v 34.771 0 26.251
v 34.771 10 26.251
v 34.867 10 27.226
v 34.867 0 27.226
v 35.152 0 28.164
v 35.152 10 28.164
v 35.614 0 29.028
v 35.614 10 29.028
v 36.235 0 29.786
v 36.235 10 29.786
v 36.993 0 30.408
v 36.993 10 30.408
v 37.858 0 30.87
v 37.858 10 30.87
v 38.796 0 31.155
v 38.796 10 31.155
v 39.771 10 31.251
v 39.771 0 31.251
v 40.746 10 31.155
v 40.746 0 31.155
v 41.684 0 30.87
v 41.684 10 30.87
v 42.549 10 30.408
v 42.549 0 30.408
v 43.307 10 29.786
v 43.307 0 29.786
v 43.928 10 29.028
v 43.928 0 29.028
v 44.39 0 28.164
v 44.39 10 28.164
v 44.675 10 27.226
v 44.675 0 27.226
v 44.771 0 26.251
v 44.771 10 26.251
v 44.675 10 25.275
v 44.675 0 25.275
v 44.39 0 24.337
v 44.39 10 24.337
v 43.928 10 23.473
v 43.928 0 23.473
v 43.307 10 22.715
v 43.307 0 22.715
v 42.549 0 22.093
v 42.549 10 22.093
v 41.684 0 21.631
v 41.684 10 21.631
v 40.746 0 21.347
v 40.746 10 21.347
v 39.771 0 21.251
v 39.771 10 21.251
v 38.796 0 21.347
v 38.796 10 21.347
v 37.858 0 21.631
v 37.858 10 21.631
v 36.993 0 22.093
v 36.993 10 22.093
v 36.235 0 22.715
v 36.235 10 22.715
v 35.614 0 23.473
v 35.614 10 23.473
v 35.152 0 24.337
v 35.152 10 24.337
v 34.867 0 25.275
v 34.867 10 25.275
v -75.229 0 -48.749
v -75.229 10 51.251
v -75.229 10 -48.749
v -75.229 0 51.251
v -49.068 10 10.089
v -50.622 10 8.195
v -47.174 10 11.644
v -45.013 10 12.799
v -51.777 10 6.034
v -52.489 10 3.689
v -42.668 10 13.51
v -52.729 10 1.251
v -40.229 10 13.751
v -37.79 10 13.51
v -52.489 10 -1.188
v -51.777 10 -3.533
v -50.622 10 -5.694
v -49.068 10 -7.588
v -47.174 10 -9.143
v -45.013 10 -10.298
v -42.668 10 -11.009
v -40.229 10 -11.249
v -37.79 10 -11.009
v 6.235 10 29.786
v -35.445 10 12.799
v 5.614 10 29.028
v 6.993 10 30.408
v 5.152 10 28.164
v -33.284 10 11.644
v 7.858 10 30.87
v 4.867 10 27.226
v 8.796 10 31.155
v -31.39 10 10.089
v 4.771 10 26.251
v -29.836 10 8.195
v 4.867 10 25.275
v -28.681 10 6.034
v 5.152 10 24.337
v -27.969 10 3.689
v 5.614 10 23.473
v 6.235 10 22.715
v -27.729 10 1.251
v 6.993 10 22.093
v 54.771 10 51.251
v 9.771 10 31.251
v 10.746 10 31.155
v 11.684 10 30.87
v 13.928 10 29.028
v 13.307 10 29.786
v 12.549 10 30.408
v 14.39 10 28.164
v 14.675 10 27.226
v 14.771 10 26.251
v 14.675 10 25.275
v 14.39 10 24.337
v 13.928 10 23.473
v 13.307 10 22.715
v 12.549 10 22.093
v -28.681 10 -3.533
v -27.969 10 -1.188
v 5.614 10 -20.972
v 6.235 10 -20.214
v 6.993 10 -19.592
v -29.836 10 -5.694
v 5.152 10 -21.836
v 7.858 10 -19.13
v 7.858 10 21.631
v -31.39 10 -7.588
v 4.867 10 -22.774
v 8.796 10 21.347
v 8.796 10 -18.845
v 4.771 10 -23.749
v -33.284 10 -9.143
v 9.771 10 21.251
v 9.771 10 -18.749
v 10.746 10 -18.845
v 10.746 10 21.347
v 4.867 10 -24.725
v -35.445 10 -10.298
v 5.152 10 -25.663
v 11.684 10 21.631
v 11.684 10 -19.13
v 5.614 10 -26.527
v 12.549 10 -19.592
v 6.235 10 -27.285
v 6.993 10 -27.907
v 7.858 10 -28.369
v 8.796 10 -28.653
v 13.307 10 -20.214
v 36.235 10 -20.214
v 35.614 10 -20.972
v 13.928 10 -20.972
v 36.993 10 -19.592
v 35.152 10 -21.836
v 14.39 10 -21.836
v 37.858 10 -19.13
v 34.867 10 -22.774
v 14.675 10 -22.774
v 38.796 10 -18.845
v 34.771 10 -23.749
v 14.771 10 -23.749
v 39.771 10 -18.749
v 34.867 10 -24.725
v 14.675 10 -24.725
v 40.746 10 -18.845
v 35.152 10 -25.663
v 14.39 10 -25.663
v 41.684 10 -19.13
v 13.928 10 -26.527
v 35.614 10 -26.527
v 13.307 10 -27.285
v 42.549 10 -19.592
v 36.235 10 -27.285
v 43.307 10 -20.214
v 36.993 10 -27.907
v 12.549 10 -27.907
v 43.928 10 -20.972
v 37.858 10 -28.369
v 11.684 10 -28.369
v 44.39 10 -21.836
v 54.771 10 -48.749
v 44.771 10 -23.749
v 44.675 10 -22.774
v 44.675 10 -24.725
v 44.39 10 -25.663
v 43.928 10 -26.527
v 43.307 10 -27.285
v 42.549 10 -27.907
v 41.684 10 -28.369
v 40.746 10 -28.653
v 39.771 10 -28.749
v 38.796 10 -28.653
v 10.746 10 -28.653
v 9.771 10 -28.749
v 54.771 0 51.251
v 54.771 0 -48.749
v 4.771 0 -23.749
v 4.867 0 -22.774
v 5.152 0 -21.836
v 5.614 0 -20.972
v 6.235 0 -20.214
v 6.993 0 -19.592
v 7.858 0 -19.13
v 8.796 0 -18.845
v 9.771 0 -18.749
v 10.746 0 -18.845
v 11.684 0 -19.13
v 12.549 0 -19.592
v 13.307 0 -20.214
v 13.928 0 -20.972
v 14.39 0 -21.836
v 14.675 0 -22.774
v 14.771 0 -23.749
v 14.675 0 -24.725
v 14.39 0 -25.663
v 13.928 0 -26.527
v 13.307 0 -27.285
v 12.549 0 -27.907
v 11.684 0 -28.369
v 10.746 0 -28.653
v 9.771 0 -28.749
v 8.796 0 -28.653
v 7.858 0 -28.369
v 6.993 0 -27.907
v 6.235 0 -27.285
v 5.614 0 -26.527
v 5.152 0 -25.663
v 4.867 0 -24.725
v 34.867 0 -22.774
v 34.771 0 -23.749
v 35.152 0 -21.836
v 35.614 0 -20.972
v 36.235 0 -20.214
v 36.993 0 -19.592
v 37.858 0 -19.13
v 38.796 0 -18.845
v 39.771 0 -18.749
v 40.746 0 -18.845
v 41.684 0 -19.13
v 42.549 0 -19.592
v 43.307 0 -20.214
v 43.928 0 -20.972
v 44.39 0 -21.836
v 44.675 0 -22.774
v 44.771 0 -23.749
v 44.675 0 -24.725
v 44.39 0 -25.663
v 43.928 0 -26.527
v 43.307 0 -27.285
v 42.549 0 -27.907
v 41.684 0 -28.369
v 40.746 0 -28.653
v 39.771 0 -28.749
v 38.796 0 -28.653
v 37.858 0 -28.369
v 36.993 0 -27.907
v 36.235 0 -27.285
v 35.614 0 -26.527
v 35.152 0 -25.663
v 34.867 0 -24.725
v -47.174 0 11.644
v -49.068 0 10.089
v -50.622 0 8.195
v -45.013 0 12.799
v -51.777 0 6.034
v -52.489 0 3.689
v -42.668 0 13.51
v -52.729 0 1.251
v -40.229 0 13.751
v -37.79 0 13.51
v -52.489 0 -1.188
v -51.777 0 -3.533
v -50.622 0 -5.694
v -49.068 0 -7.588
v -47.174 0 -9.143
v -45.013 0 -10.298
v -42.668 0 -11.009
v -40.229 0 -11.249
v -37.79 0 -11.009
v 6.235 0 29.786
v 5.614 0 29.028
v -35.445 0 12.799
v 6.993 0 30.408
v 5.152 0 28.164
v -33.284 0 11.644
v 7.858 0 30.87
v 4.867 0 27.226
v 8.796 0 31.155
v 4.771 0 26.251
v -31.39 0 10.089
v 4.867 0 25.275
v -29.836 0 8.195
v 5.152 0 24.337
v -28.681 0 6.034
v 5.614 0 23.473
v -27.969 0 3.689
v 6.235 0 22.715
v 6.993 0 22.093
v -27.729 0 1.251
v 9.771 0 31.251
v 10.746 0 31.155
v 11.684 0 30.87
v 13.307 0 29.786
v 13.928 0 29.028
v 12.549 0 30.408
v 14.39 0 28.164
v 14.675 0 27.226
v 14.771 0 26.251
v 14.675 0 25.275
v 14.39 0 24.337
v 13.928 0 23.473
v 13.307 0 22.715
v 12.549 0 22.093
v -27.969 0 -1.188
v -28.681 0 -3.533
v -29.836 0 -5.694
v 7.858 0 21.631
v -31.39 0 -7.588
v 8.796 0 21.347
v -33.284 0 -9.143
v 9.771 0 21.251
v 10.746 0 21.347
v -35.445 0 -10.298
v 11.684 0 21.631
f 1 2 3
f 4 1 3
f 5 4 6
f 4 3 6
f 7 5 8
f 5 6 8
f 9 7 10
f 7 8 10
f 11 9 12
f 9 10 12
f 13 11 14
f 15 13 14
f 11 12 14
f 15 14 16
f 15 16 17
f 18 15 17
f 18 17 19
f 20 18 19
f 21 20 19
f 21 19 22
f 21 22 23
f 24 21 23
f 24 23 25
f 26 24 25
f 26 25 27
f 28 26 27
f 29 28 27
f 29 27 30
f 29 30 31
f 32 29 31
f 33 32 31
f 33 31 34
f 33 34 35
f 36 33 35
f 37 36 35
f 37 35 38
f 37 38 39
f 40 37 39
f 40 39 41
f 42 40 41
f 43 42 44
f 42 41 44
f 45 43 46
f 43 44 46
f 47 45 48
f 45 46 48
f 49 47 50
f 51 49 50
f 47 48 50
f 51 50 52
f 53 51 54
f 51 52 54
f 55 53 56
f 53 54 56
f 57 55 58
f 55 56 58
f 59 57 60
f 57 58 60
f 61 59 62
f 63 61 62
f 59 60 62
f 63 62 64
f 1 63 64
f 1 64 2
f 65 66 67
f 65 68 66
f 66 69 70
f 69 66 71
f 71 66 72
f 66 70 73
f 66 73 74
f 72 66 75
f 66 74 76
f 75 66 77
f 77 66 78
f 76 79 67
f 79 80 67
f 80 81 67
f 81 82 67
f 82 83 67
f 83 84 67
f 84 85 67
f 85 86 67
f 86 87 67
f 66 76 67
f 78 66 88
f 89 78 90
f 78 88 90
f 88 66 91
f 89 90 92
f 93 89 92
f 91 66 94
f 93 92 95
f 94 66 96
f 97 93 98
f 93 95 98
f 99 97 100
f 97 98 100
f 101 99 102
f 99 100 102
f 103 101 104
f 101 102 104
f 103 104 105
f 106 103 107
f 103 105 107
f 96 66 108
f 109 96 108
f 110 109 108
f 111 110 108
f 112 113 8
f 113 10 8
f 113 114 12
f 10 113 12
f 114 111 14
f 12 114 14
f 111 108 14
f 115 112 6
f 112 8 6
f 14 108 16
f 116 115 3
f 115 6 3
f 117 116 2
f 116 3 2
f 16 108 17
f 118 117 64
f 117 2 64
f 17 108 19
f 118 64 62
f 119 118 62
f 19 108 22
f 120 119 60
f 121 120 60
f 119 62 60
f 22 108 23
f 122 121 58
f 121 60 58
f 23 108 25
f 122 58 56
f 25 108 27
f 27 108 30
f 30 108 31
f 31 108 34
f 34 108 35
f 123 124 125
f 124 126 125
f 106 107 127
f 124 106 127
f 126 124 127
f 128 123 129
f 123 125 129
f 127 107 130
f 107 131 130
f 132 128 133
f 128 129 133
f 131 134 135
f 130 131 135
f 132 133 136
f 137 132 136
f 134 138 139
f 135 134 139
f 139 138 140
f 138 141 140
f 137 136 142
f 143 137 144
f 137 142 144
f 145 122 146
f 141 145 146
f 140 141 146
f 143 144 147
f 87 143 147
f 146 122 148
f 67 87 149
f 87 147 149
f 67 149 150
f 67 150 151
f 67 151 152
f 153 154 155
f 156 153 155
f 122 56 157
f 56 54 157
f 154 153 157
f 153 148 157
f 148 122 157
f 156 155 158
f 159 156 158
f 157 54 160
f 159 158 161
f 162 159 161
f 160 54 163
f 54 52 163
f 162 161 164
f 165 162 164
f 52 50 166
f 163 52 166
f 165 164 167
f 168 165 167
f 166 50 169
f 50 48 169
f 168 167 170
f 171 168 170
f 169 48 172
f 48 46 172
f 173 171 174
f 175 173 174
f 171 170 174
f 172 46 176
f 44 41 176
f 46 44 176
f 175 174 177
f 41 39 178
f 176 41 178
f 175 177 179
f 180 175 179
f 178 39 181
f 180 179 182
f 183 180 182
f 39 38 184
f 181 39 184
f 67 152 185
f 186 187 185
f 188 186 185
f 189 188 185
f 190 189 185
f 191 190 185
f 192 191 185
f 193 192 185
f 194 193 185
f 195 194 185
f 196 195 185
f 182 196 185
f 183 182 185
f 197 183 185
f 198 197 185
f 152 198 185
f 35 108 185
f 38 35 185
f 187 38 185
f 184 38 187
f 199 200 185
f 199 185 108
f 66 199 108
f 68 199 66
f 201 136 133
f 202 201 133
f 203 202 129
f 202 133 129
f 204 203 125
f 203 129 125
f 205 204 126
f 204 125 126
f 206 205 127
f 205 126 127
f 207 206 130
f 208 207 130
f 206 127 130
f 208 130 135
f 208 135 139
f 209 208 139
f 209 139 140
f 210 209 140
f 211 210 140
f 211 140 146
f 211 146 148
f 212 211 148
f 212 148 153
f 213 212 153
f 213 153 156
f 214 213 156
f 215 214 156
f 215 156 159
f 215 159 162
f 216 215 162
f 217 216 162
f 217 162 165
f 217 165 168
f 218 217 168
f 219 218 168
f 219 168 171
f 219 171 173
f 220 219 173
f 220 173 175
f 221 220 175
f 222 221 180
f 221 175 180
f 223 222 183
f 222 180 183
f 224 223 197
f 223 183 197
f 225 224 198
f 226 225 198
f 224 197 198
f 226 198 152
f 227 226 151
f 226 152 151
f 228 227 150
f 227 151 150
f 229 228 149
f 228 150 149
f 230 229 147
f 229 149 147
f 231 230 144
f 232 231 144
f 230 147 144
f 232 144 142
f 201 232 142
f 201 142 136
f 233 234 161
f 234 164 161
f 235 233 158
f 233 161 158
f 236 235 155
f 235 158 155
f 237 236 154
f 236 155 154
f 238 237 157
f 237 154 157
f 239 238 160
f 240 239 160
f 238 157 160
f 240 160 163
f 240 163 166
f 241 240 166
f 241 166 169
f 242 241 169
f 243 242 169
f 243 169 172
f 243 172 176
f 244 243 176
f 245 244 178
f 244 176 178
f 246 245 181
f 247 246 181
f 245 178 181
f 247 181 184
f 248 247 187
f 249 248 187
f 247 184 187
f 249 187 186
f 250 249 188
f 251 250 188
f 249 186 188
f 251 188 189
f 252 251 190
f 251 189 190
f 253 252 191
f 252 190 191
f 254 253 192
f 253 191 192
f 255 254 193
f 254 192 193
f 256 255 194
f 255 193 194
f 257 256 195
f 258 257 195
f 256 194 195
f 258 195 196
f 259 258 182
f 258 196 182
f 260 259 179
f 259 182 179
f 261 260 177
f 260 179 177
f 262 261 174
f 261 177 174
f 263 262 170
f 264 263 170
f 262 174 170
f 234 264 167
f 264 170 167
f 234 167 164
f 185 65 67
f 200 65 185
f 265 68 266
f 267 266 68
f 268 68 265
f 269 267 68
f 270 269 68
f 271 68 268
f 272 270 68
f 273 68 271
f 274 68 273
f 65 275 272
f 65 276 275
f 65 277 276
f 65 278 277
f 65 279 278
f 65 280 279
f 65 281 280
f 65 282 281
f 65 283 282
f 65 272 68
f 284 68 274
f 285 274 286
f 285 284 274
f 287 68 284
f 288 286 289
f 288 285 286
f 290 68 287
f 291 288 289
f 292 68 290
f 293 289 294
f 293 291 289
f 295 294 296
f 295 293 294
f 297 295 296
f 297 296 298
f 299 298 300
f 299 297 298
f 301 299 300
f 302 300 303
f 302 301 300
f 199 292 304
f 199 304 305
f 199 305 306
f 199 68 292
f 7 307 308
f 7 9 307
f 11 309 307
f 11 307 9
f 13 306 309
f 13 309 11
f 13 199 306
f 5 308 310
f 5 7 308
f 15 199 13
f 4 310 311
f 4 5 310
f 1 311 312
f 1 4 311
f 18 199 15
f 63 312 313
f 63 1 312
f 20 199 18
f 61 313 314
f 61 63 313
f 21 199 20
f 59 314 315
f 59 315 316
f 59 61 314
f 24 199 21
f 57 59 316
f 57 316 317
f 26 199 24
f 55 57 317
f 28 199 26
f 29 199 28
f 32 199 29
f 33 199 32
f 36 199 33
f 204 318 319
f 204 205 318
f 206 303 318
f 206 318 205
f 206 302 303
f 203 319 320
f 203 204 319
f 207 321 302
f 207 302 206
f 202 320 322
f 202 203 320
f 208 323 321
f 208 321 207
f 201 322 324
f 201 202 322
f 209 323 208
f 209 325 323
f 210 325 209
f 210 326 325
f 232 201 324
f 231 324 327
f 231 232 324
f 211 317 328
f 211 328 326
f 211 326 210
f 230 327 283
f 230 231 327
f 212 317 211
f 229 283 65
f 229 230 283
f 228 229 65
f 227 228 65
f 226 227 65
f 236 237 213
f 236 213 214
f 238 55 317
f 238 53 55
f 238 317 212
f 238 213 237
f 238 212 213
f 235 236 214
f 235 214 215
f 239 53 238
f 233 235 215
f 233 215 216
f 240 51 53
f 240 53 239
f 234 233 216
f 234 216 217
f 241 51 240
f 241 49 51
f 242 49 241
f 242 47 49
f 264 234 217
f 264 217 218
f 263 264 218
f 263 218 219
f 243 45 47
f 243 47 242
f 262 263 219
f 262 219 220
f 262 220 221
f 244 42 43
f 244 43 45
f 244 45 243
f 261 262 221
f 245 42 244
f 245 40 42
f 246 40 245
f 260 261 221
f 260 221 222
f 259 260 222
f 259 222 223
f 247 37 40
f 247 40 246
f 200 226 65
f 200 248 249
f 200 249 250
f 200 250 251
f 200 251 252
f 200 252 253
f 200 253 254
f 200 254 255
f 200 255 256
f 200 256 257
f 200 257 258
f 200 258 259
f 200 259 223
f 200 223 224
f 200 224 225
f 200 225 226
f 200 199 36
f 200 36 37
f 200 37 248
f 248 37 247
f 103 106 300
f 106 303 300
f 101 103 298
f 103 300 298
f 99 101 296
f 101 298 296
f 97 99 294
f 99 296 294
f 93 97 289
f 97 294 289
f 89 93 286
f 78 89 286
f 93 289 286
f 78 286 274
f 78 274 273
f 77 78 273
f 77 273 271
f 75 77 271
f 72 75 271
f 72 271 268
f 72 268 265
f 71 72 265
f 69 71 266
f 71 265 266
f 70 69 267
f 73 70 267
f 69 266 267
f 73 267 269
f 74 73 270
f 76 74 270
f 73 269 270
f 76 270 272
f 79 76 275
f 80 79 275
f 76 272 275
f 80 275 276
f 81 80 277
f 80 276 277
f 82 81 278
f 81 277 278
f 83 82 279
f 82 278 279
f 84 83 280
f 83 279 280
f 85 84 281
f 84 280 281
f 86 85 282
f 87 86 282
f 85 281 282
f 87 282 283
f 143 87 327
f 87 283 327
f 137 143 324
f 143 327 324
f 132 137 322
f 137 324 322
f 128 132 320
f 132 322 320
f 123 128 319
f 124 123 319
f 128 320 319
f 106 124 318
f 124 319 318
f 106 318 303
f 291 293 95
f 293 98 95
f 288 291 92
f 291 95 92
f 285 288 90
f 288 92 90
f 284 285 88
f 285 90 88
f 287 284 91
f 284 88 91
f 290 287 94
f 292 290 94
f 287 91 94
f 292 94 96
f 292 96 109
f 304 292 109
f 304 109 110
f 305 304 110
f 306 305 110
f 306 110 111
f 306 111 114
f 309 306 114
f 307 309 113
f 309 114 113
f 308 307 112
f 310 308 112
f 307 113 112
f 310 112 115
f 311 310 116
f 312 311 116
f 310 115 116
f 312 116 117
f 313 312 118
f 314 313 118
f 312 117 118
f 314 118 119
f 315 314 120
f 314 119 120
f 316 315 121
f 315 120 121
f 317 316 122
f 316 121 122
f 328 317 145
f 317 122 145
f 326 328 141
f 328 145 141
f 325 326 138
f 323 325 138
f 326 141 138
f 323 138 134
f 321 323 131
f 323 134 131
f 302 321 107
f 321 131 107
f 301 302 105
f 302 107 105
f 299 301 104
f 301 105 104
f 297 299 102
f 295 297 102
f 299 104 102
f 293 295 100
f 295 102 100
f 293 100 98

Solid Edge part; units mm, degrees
sketch "Sketch1" plane through (0, 0, 0) normal (0, -1, 0) x (1, 0, 0)
  line L0 (-75.229, -48.7494) -> (54.771, -48.7494)
  line L1 (54.771, -48.7494) -> (54.771, 51.2506)
  line L2 (54.771, 51.2506) -> (-75.229, 51.2506)
  line L3 (-75.229, 51.2506) -> (-75.229, -48.7494)
  dimension "D1" = 100
  dimension "D2" = 130
extrude "Protrusion1" add sketch "Sketch1" against normal blind 10
sketch "Sketch2" plane through (24.771, 0, 1.2506) normal (0, -1, 0) x (1, 0, 0)
  circle A0 centre (-65, 0) radius 12.5
  dimension "D1" = 25
  dimension "D2" = 35
extrude "Cutout1" cut sketch "Sketch2" against normal through all
sketch "Sketch3" plane through (-15.229, 10, 1.2506) normal (0, 1, 0) x (-1, 0, 0)
  circle A0 centre (-25, -25) radius 5
  circle A1 centre (-25, 25) radius 5
  circle A2 centre (-55, -25) radius 5
  circle A3 centre (-55, 25) radius 5
  dimension "D1" = 10
  dimension "D2" = 10
  dimension "D3" = 10
  dimension "D4" = 10
  dimension "D5" = 50
  dimension "D6" = 30
  dimension "D7" = 15
  dimension "D8" = 25
extrude "Cutout2" cut sketch "Sketch3" against normal through all
properties material "Aluminum, 6061-T6"
